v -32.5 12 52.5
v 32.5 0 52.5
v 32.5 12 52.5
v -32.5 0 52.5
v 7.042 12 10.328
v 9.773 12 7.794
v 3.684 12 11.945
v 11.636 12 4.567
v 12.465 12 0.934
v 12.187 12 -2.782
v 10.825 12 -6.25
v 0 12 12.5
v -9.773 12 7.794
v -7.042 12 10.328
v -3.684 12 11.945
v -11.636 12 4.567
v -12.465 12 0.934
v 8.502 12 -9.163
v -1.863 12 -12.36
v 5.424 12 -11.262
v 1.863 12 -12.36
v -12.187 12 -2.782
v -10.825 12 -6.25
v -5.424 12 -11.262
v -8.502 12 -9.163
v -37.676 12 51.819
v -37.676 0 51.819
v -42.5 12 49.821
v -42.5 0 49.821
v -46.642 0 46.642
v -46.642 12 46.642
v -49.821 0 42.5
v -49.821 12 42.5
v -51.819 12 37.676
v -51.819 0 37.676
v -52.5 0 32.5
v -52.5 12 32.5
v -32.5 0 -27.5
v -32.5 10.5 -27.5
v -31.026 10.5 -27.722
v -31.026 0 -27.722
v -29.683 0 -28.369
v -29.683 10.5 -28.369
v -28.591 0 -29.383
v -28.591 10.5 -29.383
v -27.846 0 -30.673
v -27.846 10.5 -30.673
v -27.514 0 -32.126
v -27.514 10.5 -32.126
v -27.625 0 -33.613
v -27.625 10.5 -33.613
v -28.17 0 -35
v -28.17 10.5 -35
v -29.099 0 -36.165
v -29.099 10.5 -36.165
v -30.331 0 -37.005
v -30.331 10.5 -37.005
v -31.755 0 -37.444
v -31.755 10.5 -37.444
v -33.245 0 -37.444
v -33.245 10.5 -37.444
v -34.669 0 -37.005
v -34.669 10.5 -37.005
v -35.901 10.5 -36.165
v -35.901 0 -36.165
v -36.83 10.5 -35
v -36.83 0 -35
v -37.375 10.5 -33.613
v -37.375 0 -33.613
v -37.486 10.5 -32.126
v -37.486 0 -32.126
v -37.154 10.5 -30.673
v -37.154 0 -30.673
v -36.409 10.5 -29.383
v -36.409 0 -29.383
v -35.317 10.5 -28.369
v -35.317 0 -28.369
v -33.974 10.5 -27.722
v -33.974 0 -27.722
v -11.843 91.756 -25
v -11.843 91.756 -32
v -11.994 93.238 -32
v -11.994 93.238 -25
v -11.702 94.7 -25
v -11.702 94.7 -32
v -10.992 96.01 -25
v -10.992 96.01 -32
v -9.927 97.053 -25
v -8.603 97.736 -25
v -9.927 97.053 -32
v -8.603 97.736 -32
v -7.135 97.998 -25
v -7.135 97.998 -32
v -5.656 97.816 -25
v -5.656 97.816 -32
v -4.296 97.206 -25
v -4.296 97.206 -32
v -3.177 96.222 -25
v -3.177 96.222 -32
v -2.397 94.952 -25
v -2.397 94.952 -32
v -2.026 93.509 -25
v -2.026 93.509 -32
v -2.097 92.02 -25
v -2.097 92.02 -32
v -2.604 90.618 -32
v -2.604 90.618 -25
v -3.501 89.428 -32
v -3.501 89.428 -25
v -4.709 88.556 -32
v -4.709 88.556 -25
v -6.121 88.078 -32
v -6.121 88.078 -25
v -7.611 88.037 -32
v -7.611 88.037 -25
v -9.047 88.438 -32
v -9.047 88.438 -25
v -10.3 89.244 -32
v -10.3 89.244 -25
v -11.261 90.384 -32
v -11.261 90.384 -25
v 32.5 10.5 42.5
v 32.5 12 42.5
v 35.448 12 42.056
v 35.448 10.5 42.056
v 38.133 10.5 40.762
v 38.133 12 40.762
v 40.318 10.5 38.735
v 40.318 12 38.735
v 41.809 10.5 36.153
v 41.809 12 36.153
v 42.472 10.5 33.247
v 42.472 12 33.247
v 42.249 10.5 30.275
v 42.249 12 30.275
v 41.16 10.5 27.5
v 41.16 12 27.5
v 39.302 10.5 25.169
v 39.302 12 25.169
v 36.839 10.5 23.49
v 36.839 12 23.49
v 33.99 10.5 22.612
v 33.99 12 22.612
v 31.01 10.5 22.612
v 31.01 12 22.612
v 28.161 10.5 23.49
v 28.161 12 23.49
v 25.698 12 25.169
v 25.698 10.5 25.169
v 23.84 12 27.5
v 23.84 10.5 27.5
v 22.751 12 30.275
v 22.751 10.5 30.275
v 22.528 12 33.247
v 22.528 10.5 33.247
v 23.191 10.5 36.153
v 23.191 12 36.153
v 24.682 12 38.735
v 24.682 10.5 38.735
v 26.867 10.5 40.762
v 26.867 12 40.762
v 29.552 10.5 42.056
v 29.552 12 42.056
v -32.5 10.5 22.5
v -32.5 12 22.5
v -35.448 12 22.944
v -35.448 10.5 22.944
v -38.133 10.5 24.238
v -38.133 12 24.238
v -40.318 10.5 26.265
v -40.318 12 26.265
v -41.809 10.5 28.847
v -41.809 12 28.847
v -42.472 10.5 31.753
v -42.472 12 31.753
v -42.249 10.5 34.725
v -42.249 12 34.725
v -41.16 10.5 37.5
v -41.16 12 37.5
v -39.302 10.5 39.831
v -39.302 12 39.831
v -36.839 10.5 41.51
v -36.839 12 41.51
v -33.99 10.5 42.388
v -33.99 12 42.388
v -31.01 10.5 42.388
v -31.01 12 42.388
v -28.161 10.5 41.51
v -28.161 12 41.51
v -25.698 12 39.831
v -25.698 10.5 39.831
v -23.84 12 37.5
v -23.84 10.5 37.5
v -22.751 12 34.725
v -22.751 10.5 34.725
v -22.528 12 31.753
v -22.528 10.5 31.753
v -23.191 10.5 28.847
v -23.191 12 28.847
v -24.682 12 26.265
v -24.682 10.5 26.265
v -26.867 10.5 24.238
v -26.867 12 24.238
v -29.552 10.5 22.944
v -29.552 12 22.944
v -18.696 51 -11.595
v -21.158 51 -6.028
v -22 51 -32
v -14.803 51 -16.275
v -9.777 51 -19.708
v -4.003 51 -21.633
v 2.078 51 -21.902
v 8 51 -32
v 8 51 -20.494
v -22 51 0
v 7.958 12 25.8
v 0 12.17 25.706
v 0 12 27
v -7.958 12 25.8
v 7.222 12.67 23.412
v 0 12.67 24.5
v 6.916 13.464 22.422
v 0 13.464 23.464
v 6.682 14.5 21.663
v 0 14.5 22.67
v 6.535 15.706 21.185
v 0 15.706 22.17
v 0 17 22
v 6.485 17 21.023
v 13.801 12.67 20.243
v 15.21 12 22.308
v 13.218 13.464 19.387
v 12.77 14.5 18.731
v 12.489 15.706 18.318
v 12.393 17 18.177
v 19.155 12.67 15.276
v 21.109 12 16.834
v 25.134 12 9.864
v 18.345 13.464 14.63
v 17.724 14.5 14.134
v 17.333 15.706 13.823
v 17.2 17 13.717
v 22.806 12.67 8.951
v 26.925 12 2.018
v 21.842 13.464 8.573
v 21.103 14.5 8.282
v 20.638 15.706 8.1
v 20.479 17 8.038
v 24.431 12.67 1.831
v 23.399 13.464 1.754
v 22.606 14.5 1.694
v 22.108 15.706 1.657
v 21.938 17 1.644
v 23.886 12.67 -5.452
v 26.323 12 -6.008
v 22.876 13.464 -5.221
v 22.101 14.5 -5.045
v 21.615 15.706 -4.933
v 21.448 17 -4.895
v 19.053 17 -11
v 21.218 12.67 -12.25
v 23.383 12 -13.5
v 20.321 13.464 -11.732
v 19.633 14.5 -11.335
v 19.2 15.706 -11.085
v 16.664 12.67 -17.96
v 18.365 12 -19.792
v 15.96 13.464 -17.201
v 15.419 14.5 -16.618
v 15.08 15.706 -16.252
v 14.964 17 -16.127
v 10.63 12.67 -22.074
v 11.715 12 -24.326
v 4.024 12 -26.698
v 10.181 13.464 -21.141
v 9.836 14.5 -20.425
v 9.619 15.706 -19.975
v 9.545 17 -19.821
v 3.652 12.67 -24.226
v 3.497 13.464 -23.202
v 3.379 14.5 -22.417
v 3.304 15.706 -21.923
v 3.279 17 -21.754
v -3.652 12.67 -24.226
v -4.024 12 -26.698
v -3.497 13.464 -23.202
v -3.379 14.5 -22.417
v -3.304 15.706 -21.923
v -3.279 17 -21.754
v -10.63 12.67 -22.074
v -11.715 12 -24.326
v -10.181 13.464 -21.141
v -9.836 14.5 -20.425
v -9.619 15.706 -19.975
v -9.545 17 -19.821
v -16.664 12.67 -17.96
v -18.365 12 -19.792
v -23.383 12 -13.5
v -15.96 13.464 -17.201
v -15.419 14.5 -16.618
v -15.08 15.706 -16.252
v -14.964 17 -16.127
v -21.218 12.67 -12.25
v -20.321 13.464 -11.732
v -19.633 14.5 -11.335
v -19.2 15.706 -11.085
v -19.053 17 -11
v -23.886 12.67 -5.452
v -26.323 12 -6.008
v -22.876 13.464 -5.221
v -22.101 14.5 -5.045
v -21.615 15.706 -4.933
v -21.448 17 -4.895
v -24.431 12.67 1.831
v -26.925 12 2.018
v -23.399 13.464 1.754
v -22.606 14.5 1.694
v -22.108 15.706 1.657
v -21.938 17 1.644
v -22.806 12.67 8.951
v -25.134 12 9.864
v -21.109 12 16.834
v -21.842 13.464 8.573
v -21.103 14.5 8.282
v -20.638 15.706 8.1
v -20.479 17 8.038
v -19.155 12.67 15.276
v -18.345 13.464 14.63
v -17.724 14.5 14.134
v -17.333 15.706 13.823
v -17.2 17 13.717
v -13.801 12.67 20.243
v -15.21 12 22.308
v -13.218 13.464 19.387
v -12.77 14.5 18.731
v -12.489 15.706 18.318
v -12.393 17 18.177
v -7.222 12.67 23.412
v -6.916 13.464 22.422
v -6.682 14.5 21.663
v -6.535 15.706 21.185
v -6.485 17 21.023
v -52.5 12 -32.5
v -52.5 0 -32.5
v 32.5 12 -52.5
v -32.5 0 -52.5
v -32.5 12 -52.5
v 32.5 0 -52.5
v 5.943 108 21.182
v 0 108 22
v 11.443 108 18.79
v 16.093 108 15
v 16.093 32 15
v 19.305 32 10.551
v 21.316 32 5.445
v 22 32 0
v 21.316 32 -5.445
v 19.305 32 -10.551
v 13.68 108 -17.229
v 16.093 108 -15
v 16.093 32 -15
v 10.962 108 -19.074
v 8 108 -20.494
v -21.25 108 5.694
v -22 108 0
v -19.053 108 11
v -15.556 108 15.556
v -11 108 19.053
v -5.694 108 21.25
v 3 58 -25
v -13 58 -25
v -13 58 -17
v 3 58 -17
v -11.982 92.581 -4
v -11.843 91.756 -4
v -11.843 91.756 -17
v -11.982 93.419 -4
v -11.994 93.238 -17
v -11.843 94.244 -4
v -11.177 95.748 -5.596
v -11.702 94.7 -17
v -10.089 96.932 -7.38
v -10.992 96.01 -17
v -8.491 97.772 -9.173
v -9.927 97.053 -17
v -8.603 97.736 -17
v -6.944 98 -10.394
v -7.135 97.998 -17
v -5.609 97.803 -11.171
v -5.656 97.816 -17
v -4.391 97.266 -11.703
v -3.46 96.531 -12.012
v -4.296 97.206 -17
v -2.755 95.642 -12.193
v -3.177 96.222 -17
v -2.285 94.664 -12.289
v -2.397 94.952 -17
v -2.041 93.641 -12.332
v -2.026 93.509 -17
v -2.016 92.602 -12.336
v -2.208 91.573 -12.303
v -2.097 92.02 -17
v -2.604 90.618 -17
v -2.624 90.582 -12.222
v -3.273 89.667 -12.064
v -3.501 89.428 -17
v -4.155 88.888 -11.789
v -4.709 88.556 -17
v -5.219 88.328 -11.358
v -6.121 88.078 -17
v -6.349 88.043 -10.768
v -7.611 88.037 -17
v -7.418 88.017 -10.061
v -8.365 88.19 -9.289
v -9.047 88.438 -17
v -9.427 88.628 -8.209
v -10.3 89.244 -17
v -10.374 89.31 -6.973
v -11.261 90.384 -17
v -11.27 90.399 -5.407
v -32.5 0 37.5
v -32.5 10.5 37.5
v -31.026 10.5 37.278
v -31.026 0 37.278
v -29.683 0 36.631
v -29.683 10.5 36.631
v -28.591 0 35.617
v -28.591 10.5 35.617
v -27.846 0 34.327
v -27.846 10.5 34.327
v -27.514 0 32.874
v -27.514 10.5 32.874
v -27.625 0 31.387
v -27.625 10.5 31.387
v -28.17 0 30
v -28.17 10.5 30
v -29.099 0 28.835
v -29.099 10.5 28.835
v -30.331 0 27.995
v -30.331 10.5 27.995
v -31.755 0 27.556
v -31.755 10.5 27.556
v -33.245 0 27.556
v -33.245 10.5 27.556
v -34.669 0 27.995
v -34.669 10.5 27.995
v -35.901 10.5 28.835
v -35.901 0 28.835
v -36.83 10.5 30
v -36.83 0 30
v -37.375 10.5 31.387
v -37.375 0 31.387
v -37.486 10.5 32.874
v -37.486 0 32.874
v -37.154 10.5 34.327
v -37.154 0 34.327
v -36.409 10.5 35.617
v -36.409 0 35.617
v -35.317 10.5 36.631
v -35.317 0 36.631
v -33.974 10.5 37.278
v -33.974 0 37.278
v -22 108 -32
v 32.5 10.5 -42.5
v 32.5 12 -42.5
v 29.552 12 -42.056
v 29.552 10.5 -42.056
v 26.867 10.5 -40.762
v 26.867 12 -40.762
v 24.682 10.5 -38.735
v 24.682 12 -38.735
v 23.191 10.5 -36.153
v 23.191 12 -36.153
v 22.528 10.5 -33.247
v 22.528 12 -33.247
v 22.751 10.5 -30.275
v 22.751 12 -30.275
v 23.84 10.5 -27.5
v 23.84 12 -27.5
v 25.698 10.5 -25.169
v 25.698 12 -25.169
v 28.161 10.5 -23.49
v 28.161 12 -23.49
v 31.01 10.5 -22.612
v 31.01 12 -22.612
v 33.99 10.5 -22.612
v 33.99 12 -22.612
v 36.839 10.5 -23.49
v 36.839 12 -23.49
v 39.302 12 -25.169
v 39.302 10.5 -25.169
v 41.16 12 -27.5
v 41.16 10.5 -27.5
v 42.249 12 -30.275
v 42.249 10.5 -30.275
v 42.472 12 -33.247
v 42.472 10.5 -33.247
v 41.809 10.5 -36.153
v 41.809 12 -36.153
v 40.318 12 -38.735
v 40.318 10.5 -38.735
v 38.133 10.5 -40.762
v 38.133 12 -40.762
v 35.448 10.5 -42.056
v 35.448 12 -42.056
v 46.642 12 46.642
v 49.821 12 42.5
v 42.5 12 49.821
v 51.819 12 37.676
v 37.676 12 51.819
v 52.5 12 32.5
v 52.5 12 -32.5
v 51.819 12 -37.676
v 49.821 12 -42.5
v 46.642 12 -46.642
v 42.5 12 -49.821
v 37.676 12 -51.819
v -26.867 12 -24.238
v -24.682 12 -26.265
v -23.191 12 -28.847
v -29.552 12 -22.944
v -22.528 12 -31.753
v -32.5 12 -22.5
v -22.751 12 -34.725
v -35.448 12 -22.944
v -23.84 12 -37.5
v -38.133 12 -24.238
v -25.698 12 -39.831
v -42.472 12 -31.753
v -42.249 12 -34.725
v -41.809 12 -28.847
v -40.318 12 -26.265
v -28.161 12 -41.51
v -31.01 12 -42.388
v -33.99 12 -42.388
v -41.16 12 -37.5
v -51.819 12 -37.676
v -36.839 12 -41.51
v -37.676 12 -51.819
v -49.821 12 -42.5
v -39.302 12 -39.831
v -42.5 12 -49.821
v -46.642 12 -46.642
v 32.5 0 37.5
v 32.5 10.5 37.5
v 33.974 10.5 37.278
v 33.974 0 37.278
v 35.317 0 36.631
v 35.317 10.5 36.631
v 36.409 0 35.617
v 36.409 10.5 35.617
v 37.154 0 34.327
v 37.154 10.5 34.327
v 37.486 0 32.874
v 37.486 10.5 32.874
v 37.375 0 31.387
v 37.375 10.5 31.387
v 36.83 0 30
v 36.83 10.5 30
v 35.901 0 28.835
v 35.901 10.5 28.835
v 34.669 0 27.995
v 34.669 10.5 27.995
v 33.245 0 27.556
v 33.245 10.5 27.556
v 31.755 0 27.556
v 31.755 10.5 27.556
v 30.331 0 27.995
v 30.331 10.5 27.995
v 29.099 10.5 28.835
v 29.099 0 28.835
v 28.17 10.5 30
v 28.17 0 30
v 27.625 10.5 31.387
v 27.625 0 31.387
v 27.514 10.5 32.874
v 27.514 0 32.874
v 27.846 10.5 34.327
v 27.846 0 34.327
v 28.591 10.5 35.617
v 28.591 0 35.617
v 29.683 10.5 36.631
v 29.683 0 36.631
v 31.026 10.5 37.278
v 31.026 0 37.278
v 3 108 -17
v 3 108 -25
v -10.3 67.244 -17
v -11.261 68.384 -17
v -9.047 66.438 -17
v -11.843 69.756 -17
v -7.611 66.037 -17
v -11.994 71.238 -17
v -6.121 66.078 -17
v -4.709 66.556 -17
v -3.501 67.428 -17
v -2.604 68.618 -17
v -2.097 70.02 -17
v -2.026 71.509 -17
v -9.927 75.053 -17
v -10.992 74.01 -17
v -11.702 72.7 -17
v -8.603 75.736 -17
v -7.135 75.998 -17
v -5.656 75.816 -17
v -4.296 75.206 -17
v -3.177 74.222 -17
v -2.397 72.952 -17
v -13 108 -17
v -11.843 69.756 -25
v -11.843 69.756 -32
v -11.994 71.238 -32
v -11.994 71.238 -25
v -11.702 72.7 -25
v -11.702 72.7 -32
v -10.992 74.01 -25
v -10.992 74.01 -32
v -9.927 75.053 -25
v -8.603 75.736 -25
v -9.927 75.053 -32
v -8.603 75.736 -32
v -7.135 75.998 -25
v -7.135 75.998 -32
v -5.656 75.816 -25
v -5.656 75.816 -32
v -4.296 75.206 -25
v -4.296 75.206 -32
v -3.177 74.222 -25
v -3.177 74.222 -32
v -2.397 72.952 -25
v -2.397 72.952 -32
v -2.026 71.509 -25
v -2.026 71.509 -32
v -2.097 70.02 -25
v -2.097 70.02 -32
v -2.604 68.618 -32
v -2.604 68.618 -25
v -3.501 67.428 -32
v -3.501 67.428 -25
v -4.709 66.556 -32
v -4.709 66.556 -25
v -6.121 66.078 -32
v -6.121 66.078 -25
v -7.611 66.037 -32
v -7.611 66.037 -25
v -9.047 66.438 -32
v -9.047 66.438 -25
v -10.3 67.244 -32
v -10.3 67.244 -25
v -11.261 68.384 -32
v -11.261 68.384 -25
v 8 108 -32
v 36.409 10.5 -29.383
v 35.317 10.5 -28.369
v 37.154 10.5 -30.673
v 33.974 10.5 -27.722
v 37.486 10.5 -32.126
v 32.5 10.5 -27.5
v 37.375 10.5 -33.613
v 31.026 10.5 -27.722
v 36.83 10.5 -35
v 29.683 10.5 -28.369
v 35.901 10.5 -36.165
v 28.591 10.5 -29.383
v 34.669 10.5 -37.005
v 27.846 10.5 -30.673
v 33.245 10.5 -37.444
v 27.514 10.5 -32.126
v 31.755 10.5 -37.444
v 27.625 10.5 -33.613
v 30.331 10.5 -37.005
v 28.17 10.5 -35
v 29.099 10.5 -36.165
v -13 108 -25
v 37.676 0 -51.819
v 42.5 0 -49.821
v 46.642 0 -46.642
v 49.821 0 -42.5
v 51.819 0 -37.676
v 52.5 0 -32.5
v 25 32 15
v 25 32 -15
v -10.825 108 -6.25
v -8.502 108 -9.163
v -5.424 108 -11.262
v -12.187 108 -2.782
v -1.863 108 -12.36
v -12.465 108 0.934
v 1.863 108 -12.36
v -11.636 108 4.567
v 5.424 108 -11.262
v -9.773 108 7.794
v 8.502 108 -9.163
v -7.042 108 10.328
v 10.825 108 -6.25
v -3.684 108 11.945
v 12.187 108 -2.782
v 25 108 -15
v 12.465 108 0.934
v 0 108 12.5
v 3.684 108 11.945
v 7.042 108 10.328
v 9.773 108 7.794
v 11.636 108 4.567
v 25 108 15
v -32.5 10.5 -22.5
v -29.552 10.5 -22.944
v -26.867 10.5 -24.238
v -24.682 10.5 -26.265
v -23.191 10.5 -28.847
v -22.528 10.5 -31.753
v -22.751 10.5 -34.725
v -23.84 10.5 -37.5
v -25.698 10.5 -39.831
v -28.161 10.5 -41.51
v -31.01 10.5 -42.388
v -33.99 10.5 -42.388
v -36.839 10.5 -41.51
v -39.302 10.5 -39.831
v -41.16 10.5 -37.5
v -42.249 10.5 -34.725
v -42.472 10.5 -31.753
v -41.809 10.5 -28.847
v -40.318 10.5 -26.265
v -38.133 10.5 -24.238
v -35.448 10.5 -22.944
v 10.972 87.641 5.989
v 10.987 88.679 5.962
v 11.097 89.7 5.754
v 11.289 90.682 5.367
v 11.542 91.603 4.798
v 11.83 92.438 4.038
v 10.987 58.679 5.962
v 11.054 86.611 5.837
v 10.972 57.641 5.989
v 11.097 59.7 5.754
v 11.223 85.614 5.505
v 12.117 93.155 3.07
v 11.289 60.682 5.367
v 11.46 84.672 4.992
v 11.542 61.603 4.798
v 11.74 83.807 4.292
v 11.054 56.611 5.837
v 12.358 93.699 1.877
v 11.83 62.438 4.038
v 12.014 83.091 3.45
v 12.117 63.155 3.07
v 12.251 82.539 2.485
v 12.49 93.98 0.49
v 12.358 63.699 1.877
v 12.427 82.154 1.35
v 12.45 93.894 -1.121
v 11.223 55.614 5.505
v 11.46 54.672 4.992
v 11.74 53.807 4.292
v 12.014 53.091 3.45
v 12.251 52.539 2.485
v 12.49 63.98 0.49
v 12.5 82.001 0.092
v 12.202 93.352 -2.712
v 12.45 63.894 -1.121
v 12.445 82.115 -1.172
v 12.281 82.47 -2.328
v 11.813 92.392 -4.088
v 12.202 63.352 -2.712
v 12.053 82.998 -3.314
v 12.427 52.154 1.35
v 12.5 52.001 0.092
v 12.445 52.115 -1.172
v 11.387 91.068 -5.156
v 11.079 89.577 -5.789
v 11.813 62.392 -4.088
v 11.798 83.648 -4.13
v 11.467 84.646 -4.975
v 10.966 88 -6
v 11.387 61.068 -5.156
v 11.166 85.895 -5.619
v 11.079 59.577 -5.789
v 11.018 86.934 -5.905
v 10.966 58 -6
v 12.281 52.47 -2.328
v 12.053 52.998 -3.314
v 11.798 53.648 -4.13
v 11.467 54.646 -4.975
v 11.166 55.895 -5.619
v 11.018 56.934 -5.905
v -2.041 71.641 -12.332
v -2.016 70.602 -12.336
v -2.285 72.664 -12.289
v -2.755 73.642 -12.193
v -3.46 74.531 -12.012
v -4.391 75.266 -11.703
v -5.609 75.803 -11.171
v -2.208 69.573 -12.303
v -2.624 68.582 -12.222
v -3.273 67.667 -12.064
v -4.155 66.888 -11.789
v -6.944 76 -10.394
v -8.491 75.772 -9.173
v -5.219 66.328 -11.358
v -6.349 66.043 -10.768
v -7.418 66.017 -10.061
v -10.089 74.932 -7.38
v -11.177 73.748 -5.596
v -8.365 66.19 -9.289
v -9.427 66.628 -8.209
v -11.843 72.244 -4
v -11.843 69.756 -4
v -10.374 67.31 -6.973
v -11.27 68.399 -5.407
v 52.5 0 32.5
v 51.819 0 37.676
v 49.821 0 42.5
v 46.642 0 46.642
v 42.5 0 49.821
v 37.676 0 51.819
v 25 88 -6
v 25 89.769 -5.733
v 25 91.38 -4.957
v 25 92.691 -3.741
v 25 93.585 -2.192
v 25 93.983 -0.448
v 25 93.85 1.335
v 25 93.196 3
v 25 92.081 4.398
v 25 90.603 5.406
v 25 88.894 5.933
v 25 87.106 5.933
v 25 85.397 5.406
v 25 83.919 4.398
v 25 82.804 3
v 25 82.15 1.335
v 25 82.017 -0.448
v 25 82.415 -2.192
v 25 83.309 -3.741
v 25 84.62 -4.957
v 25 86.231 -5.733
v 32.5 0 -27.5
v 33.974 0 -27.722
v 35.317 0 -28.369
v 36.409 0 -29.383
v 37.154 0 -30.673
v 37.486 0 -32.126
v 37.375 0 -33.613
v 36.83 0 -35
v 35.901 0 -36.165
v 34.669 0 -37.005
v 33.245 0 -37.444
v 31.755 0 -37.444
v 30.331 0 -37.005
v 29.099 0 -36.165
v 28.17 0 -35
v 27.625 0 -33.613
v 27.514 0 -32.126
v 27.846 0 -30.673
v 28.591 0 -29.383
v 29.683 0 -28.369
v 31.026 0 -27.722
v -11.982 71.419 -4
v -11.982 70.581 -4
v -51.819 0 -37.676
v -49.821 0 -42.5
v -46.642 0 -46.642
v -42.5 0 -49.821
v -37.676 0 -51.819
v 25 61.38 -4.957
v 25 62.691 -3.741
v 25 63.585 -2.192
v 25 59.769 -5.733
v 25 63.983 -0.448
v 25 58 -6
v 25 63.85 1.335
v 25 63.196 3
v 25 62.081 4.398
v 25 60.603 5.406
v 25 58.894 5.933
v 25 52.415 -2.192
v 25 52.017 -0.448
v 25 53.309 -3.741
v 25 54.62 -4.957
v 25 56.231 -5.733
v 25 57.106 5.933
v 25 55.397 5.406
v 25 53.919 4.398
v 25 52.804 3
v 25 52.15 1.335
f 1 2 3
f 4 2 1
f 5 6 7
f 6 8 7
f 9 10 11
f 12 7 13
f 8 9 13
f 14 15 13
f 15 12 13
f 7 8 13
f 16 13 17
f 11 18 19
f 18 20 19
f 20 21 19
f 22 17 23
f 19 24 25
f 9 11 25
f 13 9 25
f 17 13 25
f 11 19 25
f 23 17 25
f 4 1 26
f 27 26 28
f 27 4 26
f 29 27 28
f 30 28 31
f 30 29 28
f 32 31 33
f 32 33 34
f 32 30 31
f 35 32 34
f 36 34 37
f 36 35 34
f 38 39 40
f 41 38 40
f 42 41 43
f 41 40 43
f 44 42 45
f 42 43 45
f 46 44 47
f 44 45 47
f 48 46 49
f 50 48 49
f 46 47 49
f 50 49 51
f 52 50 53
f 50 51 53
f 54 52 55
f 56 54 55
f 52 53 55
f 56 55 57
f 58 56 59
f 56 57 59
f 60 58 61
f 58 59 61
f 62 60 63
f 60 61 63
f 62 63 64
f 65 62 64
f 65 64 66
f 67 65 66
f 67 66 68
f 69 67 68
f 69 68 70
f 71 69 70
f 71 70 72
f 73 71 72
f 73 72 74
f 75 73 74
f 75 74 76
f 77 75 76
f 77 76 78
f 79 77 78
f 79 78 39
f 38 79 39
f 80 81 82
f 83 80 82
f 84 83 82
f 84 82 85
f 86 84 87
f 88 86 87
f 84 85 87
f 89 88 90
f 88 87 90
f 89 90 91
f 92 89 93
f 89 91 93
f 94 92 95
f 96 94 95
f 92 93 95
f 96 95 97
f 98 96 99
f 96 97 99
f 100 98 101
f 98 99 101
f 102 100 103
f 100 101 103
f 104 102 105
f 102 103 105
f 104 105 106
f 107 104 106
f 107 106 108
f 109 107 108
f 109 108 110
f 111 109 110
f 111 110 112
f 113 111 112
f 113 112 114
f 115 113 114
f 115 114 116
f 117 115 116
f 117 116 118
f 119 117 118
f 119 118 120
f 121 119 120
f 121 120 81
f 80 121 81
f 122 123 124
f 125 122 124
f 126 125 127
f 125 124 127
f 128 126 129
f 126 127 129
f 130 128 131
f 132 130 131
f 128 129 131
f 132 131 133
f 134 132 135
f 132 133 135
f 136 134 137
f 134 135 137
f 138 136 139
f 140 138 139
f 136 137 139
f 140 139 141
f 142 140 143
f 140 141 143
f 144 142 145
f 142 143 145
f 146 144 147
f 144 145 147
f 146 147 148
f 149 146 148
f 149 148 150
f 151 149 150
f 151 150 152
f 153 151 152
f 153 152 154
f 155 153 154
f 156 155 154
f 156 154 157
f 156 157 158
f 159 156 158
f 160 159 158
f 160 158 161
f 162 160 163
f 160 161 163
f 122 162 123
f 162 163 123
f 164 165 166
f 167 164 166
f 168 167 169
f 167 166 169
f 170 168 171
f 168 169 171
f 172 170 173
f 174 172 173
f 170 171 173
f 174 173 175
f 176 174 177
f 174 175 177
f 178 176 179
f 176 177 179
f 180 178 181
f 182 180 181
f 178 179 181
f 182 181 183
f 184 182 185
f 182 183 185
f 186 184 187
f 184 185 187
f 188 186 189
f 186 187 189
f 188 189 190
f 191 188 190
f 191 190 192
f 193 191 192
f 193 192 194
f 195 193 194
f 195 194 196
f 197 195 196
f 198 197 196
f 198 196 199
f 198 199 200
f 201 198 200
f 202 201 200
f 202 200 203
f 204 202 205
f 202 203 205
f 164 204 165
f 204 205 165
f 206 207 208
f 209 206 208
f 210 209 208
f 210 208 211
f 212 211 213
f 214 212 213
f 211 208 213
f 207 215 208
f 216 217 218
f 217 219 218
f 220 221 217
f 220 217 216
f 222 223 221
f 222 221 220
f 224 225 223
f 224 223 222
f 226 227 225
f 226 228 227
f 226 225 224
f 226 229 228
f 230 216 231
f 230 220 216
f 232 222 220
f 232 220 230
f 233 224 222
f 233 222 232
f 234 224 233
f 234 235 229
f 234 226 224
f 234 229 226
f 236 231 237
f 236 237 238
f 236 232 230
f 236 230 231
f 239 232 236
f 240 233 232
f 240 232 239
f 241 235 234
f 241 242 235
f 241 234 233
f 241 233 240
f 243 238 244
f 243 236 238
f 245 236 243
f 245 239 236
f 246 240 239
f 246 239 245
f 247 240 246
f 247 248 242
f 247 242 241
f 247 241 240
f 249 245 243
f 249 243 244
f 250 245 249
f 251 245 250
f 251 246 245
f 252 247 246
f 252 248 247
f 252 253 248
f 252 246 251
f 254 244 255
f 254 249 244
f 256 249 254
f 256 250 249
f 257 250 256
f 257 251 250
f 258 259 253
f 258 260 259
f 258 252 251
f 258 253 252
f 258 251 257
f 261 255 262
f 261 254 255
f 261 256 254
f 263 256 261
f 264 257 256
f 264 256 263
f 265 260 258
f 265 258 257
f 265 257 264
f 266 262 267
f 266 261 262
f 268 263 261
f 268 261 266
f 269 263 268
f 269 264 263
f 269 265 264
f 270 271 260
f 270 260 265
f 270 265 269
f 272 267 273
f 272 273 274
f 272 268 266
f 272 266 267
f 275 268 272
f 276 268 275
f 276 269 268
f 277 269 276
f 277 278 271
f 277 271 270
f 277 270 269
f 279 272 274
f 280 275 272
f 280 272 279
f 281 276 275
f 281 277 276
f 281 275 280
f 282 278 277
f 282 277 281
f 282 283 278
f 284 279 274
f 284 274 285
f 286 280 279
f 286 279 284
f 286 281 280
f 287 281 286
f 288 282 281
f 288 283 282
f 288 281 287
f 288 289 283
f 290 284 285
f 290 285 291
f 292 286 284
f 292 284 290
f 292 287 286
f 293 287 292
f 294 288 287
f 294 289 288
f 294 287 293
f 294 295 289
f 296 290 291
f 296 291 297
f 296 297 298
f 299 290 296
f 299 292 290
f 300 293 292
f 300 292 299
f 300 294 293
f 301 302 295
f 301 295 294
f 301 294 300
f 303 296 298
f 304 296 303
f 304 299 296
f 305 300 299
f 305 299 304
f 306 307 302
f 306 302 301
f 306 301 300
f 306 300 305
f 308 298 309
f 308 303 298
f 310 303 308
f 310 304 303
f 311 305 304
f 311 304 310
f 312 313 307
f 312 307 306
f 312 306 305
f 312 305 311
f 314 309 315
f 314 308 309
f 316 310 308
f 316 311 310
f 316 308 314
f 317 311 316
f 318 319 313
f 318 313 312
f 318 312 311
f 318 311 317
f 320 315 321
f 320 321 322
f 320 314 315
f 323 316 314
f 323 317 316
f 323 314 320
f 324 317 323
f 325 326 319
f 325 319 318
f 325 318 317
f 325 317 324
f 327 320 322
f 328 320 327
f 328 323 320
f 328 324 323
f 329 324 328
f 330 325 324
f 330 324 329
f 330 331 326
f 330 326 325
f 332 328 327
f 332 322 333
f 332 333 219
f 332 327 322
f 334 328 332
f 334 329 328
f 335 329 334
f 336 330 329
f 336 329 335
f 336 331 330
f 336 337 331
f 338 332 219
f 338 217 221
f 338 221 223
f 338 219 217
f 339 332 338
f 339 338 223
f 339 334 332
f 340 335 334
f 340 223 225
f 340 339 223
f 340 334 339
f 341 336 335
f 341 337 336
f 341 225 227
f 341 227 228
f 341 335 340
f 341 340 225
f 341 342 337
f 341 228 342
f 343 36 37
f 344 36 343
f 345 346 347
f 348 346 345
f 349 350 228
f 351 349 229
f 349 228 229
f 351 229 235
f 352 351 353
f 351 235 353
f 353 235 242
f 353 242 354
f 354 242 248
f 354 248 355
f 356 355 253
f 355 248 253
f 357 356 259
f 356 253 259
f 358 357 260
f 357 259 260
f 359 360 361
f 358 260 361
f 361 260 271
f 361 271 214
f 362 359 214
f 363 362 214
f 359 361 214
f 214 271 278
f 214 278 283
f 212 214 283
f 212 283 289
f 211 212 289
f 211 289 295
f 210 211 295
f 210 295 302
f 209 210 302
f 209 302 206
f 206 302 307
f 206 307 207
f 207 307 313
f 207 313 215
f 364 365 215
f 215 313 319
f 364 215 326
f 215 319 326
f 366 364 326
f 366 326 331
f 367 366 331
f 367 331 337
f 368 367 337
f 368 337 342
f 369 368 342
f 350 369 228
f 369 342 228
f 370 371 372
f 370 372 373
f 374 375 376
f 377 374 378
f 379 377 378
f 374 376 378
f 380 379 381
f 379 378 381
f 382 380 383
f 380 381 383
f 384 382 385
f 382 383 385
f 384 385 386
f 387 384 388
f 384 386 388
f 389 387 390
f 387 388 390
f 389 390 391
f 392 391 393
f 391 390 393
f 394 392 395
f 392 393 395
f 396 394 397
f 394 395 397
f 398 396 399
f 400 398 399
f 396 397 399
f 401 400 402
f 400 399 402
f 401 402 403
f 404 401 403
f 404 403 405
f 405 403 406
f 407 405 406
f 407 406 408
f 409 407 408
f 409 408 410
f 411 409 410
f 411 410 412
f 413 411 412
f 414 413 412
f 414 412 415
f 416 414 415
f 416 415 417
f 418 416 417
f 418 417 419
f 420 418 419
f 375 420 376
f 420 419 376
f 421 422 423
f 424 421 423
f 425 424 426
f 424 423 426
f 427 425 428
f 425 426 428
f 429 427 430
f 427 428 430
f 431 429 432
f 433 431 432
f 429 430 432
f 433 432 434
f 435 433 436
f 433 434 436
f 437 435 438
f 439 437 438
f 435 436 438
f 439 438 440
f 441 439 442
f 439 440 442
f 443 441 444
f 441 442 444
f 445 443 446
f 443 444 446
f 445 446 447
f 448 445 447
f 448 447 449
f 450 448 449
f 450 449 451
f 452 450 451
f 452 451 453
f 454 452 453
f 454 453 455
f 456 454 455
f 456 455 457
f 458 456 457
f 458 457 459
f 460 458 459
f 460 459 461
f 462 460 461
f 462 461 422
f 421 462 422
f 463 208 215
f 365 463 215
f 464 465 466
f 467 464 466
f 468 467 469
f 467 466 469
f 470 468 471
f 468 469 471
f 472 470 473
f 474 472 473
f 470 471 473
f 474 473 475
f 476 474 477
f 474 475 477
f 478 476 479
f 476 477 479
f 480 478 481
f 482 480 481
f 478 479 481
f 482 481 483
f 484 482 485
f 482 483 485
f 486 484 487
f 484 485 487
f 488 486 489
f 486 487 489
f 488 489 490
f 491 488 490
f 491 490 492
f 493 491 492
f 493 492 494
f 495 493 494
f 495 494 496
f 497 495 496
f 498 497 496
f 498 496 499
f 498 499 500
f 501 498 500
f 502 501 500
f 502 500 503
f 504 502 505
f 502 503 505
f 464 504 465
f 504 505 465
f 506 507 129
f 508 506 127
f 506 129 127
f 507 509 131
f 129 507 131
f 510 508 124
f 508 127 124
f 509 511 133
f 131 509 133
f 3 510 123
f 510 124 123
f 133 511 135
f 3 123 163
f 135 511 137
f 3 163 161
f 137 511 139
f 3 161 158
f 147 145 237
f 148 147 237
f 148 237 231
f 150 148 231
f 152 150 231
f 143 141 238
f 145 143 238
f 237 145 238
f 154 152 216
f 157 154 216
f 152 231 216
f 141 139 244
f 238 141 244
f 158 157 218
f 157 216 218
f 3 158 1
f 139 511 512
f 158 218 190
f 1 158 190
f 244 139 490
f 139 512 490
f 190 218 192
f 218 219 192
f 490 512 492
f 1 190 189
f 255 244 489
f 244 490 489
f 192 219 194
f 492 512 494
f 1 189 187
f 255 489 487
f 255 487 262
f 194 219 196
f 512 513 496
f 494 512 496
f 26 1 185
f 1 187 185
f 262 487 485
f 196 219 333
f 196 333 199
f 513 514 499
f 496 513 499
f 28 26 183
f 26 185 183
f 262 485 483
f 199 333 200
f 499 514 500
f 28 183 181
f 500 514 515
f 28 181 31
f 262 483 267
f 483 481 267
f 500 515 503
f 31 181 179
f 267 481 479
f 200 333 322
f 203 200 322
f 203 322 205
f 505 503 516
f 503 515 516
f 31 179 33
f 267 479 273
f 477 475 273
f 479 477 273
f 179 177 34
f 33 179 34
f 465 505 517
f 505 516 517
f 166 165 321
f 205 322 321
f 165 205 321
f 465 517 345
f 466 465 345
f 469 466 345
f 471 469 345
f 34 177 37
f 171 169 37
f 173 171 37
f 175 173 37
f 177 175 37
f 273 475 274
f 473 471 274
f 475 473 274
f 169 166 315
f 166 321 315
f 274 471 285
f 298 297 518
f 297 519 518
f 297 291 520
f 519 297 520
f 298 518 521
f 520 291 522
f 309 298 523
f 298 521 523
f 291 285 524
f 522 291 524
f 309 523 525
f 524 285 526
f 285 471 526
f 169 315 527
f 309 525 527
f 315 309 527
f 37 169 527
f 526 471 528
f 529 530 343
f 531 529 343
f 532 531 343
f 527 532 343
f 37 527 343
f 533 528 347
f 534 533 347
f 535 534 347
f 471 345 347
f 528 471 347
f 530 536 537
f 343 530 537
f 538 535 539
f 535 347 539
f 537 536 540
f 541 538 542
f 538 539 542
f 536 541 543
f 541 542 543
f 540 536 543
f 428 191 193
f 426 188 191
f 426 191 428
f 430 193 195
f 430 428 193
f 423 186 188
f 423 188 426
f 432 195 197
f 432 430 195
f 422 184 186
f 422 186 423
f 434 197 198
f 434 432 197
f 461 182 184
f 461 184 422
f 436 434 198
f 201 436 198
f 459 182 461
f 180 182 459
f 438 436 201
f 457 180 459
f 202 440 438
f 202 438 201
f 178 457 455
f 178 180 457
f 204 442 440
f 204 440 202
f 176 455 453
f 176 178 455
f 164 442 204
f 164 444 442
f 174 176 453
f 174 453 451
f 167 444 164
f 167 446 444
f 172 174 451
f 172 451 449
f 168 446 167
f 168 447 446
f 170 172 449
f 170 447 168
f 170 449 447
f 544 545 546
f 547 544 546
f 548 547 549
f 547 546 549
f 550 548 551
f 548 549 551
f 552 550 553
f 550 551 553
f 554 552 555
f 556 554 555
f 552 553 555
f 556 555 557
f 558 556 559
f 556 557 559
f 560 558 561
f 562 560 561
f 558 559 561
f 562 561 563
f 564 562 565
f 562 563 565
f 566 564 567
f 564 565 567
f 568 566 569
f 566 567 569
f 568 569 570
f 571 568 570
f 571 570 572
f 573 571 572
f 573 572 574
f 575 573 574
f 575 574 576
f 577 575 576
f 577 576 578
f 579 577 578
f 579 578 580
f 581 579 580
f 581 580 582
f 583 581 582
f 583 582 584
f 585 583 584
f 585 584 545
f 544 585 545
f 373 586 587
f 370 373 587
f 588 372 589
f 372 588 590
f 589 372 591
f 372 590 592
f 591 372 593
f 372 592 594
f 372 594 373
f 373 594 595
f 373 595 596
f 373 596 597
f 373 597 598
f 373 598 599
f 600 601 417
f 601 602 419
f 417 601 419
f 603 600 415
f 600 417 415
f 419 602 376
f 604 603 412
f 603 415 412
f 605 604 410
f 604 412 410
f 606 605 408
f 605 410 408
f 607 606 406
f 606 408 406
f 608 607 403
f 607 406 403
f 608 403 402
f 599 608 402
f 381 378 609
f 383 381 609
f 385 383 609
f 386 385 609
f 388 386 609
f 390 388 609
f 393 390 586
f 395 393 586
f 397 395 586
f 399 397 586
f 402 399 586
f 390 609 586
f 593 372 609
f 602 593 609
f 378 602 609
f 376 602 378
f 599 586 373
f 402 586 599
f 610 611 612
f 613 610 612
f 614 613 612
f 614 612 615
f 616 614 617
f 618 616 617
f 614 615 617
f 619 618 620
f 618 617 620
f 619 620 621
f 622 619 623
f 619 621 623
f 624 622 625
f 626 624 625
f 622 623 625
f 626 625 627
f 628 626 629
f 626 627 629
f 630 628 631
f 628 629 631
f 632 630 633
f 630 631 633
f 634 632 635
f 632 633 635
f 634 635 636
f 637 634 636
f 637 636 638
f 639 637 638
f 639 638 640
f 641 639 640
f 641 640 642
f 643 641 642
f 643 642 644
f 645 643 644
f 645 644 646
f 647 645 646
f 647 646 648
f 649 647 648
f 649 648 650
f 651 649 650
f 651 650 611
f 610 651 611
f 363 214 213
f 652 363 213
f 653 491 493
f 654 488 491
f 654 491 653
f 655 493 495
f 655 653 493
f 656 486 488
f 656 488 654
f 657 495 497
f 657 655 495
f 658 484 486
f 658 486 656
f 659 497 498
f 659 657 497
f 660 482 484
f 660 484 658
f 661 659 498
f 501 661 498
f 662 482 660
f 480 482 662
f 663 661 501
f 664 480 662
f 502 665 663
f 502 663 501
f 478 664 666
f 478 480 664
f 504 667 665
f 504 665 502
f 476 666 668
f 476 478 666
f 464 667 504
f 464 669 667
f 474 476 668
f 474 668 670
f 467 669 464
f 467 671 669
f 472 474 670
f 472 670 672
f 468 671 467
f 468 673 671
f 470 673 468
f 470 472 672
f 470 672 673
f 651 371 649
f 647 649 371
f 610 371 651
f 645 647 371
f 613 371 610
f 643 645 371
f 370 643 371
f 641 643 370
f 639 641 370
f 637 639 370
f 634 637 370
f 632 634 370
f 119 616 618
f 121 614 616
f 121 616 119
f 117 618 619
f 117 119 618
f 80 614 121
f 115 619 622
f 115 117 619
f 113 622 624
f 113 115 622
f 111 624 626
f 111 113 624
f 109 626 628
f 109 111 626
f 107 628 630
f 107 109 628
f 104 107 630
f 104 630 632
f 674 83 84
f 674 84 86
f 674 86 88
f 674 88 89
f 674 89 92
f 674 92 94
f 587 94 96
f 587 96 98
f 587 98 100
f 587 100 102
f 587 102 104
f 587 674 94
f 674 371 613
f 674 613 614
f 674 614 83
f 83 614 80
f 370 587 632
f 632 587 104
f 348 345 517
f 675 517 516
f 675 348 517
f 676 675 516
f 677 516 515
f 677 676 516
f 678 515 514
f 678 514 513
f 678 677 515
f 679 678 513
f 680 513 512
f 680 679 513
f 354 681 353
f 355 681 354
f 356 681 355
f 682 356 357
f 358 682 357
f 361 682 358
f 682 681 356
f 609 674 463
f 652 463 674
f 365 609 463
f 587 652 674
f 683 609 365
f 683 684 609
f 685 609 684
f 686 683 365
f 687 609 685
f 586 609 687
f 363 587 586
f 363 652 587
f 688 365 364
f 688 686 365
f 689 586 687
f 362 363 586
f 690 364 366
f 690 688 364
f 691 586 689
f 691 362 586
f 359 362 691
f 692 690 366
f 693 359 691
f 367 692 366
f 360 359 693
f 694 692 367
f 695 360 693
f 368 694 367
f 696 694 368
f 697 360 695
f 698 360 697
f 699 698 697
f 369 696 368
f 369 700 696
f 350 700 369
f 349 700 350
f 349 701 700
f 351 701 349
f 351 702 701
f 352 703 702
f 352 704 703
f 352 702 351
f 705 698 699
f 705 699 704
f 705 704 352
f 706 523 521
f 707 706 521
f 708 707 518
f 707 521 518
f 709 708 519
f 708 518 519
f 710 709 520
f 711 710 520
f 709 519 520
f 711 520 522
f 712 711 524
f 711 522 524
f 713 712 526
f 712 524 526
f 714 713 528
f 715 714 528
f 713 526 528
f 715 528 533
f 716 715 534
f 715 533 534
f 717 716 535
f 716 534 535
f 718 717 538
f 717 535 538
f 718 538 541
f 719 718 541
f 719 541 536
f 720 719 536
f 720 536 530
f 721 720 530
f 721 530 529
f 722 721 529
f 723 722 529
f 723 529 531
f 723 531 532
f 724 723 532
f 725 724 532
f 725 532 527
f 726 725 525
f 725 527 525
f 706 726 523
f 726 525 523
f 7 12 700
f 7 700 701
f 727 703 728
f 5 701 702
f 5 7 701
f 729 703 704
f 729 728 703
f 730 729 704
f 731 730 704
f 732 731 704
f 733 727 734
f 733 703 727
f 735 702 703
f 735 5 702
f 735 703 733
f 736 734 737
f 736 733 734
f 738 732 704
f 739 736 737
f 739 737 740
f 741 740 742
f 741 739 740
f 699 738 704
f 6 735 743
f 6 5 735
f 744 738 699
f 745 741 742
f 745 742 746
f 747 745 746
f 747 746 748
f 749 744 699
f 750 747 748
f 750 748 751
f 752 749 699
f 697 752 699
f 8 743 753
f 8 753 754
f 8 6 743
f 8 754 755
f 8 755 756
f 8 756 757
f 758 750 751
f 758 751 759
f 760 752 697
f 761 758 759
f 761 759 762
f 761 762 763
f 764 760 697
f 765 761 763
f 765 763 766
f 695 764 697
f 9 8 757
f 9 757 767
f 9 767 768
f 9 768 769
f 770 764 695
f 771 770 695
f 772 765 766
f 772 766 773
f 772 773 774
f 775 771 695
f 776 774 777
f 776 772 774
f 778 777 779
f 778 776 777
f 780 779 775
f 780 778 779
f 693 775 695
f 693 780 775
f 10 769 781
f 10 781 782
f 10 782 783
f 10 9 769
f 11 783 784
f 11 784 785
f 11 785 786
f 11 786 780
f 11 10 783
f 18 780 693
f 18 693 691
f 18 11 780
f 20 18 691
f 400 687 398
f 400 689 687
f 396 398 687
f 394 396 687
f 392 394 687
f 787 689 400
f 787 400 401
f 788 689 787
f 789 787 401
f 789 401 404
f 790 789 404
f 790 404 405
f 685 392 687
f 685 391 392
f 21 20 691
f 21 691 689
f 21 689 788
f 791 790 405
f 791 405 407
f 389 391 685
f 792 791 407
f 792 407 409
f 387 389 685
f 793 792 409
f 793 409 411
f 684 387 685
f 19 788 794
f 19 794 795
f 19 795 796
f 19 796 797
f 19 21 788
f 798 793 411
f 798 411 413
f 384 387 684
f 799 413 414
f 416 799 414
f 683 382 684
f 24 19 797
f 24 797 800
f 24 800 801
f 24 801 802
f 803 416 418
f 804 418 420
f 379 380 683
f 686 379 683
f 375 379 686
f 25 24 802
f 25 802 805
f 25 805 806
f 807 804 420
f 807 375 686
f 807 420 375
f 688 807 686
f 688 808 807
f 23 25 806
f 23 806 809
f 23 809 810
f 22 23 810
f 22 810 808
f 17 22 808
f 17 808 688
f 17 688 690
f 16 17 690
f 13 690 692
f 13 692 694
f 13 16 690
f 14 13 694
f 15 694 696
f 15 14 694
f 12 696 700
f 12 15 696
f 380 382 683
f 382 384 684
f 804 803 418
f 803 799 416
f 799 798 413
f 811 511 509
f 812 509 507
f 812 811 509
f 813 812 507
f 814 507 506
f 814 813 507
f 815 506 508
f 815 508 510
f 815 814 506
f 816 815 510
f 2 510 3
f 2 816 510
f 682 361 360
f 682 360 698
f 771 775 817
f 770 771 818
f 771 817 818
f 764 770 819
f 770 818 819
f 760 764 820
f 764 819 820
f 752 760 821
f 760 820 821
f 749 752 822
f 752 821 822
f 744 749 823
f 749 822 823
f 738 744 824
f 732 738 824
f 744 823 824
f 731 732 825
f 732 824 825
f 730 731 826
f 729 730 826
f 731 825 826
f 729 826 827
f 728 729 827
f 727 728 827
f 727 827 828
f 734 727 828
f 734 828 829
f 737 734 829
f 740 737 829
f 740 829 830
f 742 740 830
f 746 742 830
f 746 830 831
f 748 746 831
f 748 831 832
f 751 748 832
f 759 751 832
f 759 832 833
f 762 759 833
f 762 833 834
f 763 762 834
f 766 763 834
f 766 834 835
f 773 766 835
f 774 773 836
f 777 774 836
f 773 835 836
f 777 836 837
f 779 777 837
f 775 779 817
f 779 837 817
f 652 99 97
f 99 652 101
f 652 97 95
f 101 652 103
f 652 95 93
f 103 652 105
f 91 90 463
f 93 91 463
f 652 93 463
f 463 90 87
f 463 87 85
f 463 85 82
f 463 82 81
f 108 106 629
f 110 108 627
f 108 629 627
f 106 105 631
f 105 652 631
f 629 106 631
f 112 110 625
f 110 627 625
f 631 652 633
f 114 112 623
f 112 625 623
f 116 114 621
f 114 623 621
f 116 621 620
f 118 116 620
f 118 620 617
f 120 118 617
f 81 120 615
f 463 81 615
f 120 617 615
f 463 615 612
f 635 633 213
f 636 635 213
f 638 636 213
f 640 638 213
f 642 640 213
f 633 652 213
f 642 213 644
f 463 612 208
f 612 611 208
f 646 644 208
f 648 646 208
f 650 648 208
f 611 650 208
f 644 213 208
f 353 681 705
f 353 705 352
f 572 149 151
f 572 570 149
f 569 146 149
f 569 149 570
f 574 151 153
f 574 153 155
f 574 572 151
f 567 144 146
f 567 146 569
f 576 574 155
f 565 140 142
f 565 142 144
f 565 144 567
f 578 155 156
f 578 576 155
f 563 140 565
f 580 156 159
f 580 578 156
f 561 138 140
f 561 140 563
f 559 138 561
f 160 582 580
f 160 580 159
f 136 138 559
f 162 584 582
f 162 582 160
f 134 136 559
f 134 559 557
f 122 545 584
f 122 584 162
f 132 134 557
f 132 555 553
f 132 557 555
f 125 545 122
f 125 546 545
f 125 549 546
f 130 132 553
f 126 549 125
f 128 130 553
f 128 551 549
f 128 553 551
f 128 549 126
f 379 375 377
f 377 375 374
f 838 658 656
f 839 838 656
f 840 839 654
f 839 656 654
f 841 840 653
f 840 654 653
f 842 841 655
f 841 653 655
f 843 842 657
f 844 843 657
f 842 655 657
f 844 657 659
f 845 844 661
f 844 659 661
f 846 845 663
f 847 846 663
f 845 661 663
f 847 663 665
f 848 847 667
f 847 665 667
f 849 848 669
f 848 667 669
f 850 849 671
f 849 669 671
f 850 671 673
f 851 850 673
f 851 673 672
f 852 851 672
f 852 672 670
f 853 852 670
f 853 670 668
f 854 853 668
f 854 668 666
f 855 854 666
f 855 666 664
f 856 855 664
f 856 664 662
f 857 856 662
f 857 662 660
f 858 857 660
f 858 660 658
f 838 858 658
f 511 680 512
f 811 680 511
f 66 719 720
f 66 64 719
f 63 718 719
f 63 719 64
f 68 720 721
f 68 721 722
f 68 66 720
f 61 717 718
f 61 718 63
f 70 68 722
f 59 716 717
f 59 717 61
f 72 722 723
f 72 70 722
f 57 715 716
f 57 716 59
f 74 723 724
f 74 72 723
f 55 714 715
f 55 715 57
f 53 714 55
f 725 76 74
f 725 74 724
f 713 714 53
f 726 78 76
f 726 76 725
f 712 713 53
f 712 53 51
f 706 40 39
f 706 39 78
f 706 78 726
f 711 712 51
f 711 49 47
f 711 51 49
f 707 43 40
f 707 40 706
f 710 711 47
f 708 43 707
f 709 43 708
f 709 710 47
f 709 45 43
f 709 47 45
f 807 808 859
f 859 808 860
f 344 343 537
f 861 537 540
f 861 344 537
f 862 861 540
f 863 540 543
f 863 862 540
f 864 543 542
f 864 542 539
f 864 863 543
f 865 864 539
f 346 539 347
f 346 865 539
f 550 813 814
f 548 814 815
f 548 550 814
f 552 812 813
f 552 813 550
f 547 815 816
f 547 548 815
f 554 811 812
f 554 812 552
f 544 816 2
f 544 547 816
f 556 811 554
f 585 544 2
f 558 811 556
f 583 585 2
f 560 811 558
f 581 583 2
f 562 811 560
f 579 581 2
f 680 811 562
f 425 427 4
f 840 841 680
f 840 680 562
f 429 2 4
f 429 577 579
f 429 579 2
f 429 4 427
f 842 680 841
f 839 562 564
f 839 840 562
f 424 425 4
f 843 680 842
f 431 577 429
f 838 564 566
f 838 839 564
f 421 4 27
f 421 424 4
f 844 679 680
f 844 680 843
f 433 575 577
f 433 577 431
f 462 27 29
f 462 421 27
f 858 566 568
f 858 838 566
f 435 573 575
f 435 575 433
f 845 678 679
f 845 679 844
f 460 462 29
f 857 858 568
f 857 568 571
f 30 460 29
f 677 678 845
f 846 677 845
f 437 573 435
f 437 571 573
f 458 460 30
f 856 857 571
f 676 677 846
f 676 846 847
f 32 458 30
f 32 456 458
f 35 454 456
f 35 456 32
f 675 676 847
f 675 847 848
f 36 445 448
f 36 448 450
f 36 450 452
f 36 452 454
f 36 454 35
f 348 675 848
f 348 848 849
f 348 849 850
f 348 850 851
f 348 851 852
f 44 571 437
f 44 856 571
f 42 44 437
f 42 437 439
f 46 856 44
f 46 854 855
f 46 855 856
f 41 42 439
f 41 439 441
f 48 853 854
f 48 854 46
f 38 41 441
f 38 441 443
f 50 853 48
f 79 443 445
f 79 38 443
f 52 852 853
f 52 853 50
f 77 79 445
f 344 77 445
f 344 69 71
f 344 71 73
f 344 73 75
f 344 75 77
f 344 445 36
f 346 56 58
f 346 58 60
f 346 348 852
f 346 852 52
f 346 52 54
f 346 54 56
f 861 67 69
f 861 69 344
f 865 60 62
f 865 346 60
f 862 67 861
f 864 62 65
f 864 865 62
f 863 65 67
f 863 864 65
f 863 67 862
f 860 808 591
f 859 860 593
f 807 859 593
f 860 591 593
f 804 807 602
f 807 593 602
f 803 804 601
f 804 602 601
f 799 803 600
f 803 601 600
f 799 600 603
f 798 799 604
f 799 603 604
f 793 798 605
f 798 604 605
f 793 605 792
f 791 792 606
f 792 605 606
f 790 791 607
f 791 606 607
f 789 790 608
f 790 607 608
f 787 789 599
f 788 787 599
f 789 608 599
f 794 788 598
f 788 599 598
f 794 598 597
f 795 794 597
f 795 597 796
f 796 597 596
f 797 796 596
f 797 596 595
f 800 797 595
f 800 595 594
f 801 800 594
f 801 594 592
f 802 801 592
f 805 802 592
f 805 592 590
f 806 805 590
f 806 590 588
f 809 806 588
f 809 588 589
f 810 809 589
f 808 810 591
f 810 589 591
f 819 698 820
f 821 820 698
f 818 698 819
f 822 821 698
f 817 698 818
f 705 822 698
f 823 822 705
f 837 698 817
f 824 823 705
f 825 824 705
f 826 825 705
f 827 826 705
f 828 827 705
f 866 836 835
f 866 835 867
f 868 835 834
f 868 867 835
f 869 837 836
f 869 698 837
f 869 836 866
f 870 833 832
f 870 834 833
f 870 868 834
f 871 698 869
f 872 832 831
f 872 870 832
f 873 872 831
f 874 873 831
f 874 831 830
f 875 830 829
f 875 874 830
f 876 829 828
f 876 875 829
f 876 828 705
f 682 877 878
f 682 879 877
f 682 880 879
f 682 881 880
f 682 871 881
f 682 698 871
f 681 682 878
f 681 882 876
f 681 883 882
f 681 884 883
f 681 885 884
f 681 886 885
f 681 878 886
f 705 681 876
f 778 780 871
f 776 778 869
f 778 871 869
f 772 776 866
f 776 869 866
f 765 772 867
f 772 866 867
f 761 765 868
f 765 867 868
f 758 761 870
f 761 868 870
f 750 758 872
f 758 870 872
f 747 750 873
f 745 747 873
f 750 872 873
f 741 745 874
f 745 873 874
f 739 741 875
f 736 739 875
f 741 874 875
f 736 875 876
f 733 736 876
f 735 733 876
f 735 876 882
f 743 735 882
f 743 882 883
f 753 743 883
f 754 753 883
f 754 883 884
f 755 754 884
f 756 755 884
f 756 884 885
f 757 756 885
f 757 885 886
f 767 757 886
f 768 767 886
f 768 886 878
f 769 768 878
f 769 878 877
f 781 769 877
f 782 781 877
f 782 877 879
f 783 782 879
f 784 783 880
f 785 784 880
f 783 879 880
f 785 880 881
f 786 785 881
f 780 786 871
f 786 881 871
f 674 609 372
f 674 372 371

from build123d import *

# Parameters (mm, degrees)
BOSS_EXTRUDE2_DEPTH = 12
SKETCH2_R           = 5
CUT_EXTRUDE1_DEPTH  = 29
SKETCH3_R           = 10
CUT_EXTRUDE3_DEPTH  = 1.5
SKETCH4_R           = 22
SKETCH4_R_2         = 12.5
BOSS_EXTRUDE3_DEPTH = 96
BOSS_EXTRUDE4_START = -76
BOSS_EXTRUDE4_DEPTH = 76
BOSS_EXTRUDE5_START = -57
BOSS_EXTRUDE5_DEPTH = 57
SKETCH7_W           = 16
SKETCH7_H           = 8
CUT_EXTRUDE4_DEPTH  = 50
SKETCH8_R           = 6
CUT_EXTRUDE5_DEPTH  = 20
SKETCH9_R           = 5
CUT_EXTRUDE7_DEPTH  = 28
FILLET1_R           = 5


with BuildPart() as part:
    # Sketch1 → Boss-Extrude2 (new body)
    with BuildSketch(Plane(origin=(0, 0, 0), x_dir=(1, 0, 0), z_dir=(0, 1, 0))):
        with BuildLine():
            Line((-32.5, 52.5), (32.5, 52.5))
            ThreePointArc((32.5, 52.5), (46.642135624, 46.642135624), (52.5, 32.5))
            Line((52.5, 32.5), (52.5, -32.5))
            ThreePointArc((52.5, -32.5), (46.642135624, -46.642135624), (32.5, -52.5))
            Line((32.5, -52.5), (-32.5, -52.5))
            ThreePointArc((-32.5, -52.5), (-46.642135624, -46.642135624), (-52.5, -32.5))
            Line((-52.5, -32.5), (-52.5, 32.5))
            ThreePointArc((-52.5, 32.5), (-46.642135624, 46.642135624), (-32.5, 52.5))
        make_face()
    extrude(amount=BOSS_EXTRUDE2_DEPTH)

    # Sketch2 → Cut-Extrude1 (cut)
    with BuildSketch(Plane(origin=(0, 12, 0), x_dir=(1, 0, 0), z_dir=(0, 1, 0))):
        with Locations(Location((-32.5, 32.5, 0), (0, 0, 270))):
            Circle(SKETCH2_R)
        with Locations(Location((32.5, 32.5, 0), (0, 0, 270))):
            Circle(SKETCH2_R)
        with Locations(Location((32.5, -32.5, 0), (0, 0, 270))):
            Circle(SKETCH2_R)
        with Locations(Location((-32.5, -32.5, 0), (0, 0, 270))):
            Circle(SKETCH2_R)
    extrude(amount=-CUT_EXTRUDE1_DEPTH, mode=Mode.SUBTRACT)

    # Sketch3 → Cut-Extrude3 (cut)
    with BuildSketch(Plane(origin=(0, 12, 0), x_dir=(1, 0, 0), z_dir=(0, 1, 0))):
        with Locations(Location((-32.5, 32.5, 0), (0, 0, 270))):
            Circle(SKETCH3_R)
        with Locations(Location((32.5, 32.5, 0), (0, 0, 90))):
            Circle(SKETCH3_R)
        with Locations(Location((-32.5, -32.5, 0), (0, 0, 90))):
            Circle(SKETCH3_R)
        with Locations(Location((32.5, -32.5, 0), (0, 0, 270))):
            Circle(SKETCH3_R)
    extrude(amount=-CUT_EXTRUDE3_DEPTH, mode=Mode.SUBTRACT)

    # Sketch4 → Boss-Extrude3 (add)
    with BuildSketch(Plane(origin=(0, 12, 0), x_dir=(1, 0, 0), z_dir=(0, 1, 0))):
        with Locations(Location((0, 0, 0), (0, 0, 270))):
            Circle(SKETCH4_R)
        with Locations(Location((0, 0, 0), (0, 0, 270))):
            Circle(SKETCH4_R_2, mode=Mode.SUBTRACT)
    extrude(amount=BOSS_EXTRUDE3_DEPTH)

    # Sketch5 → Boss-Extrude4 (add)
    with BuildSketch(Plane(origin=(0, 108, 0), x_dir=(1, 0, 0), z_dir=(0, 1, 0)).offset(BOSS_EXTRUDE4_START)):
        with BuildLine():
            Line((25, 15), (25, -15))
            Line((25, -15), (16.093476939, -15))
            ThreePointArc((16.093476939, -15), (22, 0), (16.093476939, 15))
            Line((16.093476939, 15), (25, 15))
        make_face()
    extrude(amount=BOSS_EXTRUDE4_DEPTH)

    # Sketch6 → Boss-Extrude5 (add)
    with BuildSketch(Plane(origin=(0, 108, 0), x_dir=(1, 0, 0), z_dir=(0, 1, 0)).offset(BOSS_EXTRUDE5_START)):
        with BuildLine():
            Line((8, 20.493901532), (8, 32))
            Line((8, 32), (-22, 32))
            Line((-22, 32), (-22, 0))
            ThreePointArc((-22, 0), (-12.409673646, 18.165902125), (8, 20.493901532))
        make_face()
    extrude(amount=BOSS_EXTRUDE5_DEPTH)

    # Sketch7 → Cut-Extrude4 (cut)
    with BuildSketch(Plane(origin=(0, 108, 0), x_dir=(1, 0, 0), z_dir=(0, 1, 0))):
        with Locations((-5, 21)):
            Rectangle(SKETCH7_W, SKETCH7_H)
    extrude(amount=-CUT_EXTRUDE4_DEPTH, mode=Mode.SUBTRACT)

    # Sketch8 → Cut-Extrude5 (cut)
    with BuildSketch(Plane(origin=(25, 0, 0), x_dir=(0, 0, -1), z_dir=(1, 0, 0))):
        with Locations((0, 88)):
            Circle(SKETCH8_R)
        with Locations((0, 58)):
            Circle(SKETCH8_R)
    extrude(amount=-CUT_EXTRUDE5_DEPTH, mode=Mode.SUBTRACT)

    # Sketch9 → Cut-Extrude7 (cut)
    with BuildSketch(Plane(origin=(0, 0, -32), x_dir=(-1, 0, 0), z_dir=(0, 0, -1))):
        with Locations(Location((7, 93, 0), (0, 0, 345.590947366))):
            Circle(SKETCH9_R)
        with Locations(Location((7, 71, 0), (0, 0, 345.590947366))):
            Circle(SKETCH9_R)
    extrude(amount=-CUT_EXTRUDE7_DEPTH, mode=Mode.SUBTRACT)

    # Fillet1
    fillet1_edges = [part.edges().sort_by_distance(p)[0] for p in [
        (0, 12, -22),
    ]]
    fillet(fillet1_edges, radius=FILLET1_R)


solid = part.part
